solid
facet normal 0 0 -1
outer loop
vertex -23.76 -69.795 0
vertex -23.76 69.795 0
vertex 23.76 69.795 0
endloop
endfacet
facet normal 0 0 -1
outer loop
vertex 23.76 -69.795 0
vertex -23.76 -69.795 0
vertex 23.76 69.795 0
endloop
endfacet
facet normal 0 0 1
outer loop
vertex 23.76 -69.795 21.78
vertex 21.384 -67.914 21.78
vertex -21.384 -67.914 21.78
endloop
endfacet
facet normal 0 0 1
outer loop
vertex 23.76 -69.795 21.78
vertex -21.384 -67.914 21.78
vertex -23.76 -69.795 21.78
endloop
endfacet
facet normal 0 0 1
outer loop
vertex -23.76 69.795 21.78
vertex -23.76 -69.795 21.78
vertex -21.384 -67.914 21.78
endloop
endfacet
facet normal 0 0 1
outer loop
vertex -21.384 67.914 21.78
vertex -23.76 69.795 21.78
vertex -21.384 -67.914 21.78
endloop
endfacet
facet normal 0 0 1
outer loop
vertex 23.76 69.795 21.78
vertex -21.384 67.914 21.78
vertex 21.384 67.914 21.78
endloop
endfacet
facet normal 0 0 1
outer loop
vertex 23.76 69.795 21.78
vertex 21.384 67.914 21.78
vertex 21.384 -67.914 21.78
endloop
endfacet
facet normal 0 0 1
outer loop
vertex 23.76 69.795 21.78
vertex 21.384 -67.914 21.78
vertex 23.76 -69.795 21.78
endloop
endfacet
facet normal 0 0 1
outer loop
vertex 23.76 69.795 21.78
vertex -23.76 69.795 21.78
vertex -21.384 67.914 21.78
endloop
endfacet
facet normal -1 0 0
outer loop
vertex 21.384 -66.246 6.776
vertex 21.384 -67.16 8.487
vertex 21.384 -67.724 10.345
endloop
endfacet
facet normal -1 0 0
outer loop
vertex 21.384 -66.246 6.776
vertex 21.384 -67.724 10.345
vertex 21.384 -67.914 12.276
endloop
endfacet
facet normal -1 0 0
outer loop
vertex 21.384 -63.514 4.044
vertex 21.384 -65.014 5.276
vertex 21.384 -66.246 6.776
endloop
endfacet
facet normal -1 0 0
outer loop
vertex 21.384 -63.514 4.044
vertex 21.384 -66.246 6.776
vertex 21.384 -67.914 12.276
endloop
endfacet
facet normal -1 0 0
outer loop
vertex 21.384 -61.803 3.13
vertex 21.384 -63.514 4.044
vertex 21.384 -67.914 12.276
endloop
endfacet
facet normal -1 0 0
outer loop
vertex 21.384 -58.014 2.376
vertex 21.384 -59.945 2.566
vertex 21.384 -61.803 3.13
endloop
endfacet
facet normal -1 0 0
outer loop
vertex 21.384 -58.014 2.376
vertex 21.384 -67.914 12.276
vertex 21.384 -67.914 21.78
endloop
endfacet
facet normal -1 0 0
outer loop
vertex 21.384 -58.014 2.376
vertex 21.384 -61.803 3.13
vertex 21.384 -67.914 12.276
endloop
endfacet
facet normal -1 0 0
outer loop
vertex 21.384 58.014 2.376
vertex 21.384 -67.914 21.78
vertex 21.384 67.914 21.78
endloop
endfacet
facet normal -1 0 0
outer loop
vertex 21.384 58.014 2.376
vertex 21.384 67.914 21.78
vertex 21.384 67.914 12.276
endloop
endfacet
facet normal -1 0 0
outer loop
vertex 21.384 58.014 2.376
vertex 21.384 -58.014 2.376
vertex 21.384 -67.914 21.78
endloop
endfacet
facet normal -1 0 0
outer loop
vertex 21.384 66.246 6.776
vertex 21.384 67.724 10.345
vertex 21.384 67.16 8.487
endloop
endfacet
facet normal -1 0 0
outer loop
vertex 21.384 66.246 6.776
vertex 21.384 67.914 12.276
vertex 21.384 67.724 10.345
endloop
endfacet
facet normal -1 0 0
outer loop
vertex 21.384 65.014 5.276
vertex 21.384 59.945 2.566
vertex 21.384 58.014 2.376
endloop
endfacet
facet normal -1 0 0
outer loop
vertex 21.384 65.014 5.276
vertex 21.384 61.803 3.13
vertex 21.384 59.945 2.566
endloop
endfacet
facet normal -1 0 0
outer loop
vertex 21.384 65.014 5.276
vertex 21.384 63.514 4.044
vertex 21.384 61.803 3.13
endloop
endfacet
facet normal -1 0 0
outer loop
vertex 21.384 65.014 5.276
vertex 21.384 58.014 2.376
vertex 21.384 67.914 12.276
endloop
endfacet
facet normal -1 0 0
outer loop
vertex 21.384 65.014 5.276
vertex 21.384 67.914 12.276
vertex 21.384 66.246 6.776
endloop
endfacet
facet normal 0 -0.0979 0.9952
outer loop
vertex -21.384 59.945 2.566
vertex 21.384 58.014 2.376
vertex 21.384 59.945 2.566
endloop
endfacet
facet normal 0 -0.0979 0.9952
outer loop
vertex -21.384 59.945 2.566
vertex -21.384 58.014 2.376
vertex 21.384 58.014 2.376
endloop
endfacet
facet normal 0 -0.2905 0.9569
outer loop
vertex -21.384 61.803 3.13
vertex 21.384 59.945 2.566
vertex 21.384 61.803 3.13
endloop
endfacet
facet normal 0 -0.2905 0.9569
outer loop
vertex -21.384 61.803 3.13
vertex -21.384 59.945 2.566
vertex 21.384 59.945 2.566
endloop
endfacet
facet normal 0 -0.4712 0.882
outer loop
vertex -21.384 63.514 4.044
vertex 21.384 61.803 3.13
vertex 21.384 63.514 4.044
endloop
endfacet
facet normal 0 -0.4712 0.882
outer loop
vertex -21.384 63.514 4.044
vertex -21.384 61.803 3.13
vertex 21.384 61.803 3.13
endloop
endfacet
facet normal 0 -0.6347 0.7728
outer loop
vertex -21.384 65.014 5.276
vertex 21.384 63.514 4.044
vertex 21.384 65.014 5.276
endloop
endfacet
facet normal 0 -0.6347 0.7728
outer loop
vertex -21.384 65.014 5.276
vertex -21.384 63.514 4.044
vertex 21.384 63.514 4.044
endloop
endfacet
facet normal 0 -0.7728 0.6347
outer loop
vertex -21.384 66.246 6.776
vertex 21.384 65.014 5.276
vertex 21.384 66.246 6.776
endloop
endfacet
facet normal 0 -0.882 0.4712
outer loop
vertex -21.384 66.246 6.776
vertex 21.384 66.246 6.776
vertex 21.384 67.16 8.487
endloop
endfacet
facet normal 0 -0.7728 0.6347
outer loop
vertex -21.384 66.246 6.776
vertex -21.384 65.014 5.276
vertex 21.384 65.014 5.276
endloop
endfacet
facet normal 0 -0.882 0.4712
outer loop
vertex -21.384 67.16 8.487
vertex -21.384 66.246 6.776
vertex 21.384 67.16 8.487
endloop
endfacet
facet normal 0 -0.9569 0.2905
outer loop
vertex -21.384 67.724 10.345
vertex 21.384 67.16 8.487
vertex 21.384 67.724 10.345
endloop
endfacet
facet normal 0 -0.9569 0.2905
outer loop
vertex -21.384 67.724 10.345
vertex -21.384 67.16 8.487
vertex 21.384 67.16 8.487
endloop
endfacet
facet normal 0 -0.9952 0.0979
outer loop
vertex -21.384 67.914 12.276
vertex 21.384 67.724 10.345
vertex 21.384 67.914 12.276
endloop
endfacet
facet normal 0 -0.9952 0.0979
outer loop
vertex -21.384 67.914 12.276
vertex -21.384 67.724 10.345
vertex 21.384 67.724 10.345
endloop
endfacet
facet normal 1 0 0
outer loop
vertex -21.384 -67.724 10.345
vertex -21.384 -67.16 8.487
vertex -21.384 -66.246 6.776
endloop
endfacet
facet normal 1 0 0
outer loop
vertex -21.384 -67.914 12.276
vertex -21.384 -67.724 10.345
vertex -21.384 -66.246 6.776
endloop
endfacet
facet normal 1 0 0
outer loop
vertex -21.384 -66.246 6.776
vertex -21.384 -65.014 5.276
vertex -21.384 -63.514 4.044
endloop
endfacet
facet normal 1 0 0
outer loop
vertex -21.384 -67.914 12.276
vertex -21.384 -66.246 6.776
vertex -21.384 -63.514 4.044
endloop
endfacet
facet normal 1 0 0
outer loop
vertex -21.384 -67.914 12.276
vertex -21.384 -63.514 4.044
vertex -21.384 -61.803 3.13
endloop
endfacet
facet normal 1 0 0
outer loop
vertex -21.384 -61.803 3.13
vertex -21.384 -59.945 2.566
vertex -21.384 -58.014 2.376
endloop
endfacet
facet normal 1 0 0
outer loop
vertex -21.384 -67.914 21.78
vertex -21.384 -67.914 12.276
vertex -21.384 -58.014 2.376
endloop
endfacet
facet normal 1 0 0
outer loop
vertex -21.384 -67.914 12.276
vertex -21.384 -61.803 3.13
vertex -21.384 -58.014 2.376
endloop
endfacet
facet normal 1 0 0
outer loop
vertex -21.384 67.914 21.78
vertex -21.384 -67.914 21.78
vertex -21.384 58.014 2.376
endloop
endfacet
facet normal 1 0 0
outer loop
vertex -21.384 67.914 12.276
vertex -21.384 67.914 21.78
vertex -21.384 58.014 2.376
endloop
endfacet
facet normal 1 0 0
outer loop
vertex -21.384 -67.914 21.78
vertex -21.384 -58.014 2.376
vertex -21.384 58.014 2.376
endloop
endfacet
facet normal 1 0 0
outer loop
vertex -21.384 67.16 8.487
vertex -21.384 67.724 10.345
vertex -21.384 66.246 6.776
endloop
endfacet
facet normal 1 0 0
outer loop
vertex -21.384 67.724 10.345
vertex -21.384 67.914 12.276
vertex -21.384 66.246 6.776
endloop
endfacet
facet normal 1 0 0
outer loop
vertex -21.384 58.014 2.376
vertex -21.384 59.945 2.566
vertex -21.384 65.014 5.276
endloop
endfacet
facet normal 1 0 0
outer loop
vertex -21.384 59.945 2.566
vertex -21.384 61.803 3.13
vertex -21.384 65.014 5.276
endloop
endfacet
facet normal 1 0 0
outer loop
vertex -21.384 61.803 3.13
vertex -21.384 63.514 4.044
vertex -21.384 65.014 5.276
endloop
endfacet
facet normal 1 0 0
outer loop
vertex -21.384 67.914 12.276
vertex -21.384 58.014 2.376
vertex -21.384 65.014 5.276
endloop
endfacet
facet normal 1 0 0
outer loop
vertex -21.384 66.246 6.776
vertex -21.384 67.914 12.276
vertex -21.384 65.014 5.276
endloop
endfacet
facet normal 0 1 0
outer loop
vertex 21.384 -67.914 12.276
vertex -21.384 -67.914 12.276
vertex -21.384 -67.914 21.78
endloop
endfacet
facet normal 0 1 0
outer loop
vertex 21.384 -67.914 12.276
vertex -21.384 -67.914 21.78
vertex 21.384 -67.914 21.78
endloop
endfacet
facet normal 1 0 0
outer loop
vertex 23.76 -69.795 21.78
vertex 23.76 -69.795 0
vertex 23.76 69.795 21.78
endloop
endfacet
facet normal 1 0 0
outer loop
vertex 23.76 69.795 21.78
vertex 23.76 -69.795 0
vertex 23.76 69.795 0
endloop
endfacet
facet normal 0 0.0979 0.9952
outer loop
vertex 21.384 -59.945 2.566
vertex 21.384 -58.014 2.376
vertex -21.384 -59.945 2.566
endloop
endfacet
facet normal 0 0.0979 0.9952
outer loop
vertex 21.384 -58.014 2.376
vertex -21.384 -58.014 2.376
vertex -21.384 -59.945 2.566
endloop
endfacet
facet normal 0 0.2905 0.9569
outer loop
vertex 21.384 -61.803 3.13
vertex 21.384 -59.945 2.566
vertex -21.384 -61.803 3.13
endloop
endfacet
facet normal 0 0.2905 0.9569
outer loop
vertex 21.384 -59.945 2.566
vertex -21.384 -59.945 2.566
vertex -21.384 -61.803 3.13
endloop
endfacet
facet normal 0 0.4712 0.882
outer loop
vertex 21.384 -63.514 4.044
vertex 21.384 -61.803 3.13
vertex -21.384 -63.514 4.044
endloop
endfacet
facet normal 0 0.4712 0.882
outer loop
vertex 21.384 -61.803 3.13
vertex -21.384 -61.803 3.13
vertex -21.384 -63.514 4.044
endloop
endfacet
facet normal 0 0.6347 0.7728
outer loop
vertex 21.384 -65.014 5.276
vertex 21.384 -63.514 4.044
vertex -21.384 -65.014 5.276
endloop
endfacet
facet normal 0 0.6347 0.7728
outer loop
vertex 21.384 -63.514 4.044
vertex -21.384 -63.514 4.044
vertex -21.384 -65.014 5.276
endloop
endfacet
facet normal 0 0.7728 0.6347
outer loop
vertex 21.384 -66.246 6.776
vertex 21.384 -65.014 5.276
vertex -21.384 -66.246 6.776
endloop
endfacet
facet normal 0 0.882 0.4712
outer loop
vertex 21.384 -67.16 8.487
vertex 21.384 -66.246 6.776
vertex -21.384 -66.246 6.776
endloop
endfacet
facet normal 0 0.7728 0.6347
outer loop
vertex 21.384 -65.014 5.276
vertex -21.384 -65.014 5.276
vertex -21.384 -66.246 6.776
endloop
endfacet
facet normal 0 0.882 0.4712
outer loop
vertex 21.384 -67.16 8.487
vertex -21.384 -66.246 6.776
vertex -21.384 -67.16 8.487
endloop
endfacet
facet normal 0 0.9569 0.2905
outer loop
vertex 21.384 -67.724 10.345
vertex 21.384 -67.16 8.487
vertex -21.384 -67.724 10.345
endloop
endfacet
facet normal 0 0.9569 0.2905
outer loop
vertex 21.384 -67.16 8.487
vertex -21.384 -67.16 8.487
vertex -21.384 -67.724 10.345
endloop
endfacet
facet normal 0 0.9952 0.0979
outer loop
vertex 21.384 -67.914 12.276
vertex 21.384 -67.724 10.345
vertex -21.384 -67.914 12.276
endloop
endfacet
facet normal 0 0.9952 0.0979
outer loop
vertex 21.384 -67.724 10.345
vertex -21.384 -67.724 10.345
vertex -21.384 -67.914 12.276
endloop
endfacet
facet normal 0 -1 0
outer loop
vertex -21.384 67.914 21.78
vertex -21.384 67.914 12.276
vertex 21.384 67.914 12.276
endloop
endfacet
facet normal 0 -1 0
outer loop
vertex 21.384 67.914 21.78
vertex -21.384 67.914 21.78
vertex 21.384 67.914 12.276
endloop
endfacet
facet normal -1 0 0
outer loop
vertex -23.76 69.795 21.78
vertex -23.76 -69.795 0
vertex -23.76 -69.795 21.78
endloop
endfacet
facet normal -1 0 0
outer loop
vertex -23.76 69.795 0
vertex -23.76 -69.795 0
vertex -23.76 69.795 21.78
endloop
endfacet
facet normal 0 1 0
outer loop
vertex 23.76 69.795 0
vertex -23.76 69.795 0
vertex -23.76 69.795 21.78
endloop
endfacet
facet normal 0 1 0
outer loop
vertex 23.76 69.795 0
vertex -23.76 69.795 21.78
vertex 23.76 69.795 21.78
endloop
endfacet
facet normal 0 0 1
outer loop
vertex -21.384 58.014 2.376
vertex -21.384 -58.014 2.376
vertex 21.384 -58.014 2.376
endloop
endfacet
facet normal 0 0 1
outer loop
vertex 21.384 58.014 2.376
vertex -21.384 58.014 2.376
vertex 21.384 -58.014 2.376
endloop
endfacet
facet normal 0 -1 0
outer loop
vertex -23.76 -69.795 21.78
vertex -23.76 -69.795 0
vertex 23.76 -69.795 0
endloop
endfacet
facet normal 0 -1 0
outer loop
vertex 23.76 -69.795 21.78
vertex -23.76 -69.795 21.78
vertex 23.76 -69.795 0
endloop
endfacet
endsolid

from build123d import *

# Parameters (mm, degrees)
F0_W     = 48
F0_H     = 141
F0_W_2   = 43.2
F0_H_2   = 137.2
F1_DEPTH = 2.4
F2_DEPTH = 22
F3_R     = 10
F4_SCALE = 0.99


with BuildPart() as f1:
    # F0 (on Top) → F1 (new body)
    with BuildSketch(Plane.XY):
        Rectangle(F0_W, F0_H)
        Rectangle(F0_W_2, F0_H_2, mode=Mode.SUBTRACT)
        Rectangle(F0_W_2, F0_H_2)
    extrude(amount=F1_DEPTH)

    # F0 (on Top) → F2 (join)
    with BuildSketch(Plane.XY):
        Rectangle(F0_W, F0_H)
        Rectangle(F0_W_2, F0_H_2, mode=Mode.SUBTRACT)
    extrude(amount=F2_DEPTH)

    # F3
    f3_edges = [f1.edges().sort_by_distance(p)[0] for p in [
        (0, -68.6, 2.4),
        (0, 68.6, 2.4),
    ]]
    fillet(f3_edges, radius=F3_R)


with BuildPart() as f1_1:
    # F4: moved
    add(f1.part.scale(F4_SCALE))


solid = f1_1.part
